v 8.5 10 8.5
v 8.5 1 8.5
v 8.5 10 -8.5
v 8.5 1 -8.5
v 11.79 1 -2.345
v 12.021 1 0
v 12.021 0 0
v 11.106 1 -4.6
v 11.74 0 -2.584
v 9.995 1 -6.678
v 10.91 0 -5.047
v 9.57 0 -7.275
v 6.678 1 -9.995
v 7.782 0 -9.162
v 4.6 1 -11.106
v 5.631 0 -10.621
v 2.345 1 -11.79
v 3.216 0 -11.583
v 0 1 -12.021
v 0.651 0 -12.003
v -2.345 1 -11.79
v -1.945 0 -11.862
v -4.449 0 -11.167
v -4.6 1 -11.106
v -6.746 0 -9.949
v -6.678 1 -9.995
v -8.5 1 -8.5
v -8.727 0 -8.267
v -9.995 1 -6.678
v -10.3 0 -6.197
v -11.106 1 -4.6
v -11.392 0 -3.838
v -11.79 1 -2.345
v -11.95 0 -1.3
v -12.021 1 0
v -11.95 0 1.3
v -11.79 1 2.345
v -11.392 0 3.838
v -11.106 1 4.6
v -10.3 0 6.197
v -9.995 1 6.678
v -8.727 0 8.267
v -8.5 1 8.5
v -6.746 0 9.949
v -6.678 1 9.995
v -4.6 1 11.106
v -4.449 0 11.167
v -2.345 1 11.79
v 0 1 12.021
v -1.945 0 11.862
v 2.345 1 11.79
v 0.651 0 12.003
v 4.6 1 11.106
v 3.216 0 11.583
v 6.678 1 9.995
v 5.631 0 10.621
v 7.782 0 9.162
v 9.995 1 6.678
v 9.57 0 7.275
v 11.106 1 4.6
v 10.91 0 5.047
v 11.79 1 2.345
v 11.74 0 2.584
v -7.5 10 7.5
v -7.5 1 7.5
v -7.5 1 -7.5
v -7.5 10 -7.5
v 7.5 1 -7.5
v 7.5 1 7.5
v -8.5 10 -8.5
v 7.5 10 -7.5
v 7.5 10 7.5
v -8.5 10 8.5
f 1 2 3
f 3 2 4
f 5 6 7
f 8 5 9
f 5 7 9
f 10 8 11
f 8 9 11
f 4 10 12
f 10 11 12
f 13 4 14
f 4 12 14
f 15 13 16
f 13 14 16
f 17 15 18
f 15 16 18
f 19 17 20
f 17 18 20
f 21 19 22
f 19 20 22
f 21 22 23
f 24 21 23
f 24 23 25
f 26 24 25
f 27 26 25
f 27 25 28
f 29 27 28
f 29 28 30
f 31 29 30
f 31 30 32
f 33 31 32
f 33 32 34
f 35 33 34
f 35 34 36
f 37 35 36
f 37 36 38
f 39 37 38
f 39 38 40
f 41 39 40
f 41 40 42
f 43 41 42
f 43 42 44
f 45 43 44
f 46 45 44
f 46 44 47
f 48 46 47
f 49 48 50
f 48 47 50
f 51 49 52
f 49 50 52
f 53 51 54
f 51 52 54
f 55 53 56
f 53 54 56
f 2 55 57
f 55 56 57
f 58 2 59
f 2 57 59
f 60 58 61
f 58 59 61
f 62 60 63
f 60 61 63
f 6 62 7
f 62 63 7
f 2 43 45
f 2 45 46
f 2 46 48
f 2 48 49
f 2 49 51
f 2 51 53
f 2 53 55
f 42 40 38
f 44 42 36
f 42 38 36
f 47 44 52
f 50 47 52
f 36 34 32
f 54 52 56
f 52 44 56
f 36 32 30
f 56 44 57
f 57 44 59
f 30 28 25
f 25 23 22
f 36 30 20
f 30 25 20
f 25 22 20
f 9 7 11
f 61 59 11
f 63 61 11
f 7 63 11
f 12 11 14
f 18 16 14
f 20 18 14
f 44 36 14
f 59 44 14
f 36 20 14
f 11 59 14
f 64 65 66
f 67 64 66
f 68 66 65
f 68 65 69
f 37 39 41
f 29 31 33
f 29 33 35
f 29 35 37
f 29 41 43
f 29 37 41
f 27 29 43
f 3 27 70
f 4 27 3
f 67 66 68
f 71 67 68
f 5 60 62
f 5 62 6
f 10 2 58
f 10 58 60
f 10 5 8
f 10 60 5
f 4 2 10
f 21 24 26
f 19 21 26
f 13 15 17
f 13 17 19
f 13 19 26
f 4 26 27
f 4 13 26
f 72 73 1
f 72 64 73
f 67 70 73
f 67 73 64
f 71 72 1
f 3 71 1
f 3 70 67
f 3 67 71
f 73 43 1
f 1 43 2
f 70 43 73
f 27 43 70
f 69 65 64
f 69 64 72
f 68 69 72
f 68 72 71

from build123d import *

# Parameters (mm, degrees)
SKETCH1_W           = 17
SKETCH1_H           = 17
SKETCH1_W_2         = 15
SKETCH1_H_2         = 15
EXTRUDE_THIN1_DEPTH = 10
SKETCH2_R           = 12.02081528
BOSS_EXTRUDE1_DEPTH = 1


with BuildPart() as part:
    # Sketch1 → Extrude-Thin1 (new body)
    with BuildSketch(Plane(origin=(0, 0, 0), x_dir=(1, 0, 0), z_dir=(0, 1, 0))):
        Rectangle(SKETCH1_W, SKETCH1_H)
        Rectangle(SKETCH1_W_2, SKETCH1_H_2, mode=Mode.SUBTRACT)
    extrude(amount=EXTRUDE_THIN1_DEPTH)

    # Sketch2 → Boss-Extrude1 (add)
    with BuildSketch(Plane(origin=(0, 0, 0), x_dir=(1, 0, 0), z_dir=(0, 1, 0))):
        Circle(SKETCH2_R)
    extrude(amount=BOSS_EXTRUDE1_DEPTH)


solid = part.part
